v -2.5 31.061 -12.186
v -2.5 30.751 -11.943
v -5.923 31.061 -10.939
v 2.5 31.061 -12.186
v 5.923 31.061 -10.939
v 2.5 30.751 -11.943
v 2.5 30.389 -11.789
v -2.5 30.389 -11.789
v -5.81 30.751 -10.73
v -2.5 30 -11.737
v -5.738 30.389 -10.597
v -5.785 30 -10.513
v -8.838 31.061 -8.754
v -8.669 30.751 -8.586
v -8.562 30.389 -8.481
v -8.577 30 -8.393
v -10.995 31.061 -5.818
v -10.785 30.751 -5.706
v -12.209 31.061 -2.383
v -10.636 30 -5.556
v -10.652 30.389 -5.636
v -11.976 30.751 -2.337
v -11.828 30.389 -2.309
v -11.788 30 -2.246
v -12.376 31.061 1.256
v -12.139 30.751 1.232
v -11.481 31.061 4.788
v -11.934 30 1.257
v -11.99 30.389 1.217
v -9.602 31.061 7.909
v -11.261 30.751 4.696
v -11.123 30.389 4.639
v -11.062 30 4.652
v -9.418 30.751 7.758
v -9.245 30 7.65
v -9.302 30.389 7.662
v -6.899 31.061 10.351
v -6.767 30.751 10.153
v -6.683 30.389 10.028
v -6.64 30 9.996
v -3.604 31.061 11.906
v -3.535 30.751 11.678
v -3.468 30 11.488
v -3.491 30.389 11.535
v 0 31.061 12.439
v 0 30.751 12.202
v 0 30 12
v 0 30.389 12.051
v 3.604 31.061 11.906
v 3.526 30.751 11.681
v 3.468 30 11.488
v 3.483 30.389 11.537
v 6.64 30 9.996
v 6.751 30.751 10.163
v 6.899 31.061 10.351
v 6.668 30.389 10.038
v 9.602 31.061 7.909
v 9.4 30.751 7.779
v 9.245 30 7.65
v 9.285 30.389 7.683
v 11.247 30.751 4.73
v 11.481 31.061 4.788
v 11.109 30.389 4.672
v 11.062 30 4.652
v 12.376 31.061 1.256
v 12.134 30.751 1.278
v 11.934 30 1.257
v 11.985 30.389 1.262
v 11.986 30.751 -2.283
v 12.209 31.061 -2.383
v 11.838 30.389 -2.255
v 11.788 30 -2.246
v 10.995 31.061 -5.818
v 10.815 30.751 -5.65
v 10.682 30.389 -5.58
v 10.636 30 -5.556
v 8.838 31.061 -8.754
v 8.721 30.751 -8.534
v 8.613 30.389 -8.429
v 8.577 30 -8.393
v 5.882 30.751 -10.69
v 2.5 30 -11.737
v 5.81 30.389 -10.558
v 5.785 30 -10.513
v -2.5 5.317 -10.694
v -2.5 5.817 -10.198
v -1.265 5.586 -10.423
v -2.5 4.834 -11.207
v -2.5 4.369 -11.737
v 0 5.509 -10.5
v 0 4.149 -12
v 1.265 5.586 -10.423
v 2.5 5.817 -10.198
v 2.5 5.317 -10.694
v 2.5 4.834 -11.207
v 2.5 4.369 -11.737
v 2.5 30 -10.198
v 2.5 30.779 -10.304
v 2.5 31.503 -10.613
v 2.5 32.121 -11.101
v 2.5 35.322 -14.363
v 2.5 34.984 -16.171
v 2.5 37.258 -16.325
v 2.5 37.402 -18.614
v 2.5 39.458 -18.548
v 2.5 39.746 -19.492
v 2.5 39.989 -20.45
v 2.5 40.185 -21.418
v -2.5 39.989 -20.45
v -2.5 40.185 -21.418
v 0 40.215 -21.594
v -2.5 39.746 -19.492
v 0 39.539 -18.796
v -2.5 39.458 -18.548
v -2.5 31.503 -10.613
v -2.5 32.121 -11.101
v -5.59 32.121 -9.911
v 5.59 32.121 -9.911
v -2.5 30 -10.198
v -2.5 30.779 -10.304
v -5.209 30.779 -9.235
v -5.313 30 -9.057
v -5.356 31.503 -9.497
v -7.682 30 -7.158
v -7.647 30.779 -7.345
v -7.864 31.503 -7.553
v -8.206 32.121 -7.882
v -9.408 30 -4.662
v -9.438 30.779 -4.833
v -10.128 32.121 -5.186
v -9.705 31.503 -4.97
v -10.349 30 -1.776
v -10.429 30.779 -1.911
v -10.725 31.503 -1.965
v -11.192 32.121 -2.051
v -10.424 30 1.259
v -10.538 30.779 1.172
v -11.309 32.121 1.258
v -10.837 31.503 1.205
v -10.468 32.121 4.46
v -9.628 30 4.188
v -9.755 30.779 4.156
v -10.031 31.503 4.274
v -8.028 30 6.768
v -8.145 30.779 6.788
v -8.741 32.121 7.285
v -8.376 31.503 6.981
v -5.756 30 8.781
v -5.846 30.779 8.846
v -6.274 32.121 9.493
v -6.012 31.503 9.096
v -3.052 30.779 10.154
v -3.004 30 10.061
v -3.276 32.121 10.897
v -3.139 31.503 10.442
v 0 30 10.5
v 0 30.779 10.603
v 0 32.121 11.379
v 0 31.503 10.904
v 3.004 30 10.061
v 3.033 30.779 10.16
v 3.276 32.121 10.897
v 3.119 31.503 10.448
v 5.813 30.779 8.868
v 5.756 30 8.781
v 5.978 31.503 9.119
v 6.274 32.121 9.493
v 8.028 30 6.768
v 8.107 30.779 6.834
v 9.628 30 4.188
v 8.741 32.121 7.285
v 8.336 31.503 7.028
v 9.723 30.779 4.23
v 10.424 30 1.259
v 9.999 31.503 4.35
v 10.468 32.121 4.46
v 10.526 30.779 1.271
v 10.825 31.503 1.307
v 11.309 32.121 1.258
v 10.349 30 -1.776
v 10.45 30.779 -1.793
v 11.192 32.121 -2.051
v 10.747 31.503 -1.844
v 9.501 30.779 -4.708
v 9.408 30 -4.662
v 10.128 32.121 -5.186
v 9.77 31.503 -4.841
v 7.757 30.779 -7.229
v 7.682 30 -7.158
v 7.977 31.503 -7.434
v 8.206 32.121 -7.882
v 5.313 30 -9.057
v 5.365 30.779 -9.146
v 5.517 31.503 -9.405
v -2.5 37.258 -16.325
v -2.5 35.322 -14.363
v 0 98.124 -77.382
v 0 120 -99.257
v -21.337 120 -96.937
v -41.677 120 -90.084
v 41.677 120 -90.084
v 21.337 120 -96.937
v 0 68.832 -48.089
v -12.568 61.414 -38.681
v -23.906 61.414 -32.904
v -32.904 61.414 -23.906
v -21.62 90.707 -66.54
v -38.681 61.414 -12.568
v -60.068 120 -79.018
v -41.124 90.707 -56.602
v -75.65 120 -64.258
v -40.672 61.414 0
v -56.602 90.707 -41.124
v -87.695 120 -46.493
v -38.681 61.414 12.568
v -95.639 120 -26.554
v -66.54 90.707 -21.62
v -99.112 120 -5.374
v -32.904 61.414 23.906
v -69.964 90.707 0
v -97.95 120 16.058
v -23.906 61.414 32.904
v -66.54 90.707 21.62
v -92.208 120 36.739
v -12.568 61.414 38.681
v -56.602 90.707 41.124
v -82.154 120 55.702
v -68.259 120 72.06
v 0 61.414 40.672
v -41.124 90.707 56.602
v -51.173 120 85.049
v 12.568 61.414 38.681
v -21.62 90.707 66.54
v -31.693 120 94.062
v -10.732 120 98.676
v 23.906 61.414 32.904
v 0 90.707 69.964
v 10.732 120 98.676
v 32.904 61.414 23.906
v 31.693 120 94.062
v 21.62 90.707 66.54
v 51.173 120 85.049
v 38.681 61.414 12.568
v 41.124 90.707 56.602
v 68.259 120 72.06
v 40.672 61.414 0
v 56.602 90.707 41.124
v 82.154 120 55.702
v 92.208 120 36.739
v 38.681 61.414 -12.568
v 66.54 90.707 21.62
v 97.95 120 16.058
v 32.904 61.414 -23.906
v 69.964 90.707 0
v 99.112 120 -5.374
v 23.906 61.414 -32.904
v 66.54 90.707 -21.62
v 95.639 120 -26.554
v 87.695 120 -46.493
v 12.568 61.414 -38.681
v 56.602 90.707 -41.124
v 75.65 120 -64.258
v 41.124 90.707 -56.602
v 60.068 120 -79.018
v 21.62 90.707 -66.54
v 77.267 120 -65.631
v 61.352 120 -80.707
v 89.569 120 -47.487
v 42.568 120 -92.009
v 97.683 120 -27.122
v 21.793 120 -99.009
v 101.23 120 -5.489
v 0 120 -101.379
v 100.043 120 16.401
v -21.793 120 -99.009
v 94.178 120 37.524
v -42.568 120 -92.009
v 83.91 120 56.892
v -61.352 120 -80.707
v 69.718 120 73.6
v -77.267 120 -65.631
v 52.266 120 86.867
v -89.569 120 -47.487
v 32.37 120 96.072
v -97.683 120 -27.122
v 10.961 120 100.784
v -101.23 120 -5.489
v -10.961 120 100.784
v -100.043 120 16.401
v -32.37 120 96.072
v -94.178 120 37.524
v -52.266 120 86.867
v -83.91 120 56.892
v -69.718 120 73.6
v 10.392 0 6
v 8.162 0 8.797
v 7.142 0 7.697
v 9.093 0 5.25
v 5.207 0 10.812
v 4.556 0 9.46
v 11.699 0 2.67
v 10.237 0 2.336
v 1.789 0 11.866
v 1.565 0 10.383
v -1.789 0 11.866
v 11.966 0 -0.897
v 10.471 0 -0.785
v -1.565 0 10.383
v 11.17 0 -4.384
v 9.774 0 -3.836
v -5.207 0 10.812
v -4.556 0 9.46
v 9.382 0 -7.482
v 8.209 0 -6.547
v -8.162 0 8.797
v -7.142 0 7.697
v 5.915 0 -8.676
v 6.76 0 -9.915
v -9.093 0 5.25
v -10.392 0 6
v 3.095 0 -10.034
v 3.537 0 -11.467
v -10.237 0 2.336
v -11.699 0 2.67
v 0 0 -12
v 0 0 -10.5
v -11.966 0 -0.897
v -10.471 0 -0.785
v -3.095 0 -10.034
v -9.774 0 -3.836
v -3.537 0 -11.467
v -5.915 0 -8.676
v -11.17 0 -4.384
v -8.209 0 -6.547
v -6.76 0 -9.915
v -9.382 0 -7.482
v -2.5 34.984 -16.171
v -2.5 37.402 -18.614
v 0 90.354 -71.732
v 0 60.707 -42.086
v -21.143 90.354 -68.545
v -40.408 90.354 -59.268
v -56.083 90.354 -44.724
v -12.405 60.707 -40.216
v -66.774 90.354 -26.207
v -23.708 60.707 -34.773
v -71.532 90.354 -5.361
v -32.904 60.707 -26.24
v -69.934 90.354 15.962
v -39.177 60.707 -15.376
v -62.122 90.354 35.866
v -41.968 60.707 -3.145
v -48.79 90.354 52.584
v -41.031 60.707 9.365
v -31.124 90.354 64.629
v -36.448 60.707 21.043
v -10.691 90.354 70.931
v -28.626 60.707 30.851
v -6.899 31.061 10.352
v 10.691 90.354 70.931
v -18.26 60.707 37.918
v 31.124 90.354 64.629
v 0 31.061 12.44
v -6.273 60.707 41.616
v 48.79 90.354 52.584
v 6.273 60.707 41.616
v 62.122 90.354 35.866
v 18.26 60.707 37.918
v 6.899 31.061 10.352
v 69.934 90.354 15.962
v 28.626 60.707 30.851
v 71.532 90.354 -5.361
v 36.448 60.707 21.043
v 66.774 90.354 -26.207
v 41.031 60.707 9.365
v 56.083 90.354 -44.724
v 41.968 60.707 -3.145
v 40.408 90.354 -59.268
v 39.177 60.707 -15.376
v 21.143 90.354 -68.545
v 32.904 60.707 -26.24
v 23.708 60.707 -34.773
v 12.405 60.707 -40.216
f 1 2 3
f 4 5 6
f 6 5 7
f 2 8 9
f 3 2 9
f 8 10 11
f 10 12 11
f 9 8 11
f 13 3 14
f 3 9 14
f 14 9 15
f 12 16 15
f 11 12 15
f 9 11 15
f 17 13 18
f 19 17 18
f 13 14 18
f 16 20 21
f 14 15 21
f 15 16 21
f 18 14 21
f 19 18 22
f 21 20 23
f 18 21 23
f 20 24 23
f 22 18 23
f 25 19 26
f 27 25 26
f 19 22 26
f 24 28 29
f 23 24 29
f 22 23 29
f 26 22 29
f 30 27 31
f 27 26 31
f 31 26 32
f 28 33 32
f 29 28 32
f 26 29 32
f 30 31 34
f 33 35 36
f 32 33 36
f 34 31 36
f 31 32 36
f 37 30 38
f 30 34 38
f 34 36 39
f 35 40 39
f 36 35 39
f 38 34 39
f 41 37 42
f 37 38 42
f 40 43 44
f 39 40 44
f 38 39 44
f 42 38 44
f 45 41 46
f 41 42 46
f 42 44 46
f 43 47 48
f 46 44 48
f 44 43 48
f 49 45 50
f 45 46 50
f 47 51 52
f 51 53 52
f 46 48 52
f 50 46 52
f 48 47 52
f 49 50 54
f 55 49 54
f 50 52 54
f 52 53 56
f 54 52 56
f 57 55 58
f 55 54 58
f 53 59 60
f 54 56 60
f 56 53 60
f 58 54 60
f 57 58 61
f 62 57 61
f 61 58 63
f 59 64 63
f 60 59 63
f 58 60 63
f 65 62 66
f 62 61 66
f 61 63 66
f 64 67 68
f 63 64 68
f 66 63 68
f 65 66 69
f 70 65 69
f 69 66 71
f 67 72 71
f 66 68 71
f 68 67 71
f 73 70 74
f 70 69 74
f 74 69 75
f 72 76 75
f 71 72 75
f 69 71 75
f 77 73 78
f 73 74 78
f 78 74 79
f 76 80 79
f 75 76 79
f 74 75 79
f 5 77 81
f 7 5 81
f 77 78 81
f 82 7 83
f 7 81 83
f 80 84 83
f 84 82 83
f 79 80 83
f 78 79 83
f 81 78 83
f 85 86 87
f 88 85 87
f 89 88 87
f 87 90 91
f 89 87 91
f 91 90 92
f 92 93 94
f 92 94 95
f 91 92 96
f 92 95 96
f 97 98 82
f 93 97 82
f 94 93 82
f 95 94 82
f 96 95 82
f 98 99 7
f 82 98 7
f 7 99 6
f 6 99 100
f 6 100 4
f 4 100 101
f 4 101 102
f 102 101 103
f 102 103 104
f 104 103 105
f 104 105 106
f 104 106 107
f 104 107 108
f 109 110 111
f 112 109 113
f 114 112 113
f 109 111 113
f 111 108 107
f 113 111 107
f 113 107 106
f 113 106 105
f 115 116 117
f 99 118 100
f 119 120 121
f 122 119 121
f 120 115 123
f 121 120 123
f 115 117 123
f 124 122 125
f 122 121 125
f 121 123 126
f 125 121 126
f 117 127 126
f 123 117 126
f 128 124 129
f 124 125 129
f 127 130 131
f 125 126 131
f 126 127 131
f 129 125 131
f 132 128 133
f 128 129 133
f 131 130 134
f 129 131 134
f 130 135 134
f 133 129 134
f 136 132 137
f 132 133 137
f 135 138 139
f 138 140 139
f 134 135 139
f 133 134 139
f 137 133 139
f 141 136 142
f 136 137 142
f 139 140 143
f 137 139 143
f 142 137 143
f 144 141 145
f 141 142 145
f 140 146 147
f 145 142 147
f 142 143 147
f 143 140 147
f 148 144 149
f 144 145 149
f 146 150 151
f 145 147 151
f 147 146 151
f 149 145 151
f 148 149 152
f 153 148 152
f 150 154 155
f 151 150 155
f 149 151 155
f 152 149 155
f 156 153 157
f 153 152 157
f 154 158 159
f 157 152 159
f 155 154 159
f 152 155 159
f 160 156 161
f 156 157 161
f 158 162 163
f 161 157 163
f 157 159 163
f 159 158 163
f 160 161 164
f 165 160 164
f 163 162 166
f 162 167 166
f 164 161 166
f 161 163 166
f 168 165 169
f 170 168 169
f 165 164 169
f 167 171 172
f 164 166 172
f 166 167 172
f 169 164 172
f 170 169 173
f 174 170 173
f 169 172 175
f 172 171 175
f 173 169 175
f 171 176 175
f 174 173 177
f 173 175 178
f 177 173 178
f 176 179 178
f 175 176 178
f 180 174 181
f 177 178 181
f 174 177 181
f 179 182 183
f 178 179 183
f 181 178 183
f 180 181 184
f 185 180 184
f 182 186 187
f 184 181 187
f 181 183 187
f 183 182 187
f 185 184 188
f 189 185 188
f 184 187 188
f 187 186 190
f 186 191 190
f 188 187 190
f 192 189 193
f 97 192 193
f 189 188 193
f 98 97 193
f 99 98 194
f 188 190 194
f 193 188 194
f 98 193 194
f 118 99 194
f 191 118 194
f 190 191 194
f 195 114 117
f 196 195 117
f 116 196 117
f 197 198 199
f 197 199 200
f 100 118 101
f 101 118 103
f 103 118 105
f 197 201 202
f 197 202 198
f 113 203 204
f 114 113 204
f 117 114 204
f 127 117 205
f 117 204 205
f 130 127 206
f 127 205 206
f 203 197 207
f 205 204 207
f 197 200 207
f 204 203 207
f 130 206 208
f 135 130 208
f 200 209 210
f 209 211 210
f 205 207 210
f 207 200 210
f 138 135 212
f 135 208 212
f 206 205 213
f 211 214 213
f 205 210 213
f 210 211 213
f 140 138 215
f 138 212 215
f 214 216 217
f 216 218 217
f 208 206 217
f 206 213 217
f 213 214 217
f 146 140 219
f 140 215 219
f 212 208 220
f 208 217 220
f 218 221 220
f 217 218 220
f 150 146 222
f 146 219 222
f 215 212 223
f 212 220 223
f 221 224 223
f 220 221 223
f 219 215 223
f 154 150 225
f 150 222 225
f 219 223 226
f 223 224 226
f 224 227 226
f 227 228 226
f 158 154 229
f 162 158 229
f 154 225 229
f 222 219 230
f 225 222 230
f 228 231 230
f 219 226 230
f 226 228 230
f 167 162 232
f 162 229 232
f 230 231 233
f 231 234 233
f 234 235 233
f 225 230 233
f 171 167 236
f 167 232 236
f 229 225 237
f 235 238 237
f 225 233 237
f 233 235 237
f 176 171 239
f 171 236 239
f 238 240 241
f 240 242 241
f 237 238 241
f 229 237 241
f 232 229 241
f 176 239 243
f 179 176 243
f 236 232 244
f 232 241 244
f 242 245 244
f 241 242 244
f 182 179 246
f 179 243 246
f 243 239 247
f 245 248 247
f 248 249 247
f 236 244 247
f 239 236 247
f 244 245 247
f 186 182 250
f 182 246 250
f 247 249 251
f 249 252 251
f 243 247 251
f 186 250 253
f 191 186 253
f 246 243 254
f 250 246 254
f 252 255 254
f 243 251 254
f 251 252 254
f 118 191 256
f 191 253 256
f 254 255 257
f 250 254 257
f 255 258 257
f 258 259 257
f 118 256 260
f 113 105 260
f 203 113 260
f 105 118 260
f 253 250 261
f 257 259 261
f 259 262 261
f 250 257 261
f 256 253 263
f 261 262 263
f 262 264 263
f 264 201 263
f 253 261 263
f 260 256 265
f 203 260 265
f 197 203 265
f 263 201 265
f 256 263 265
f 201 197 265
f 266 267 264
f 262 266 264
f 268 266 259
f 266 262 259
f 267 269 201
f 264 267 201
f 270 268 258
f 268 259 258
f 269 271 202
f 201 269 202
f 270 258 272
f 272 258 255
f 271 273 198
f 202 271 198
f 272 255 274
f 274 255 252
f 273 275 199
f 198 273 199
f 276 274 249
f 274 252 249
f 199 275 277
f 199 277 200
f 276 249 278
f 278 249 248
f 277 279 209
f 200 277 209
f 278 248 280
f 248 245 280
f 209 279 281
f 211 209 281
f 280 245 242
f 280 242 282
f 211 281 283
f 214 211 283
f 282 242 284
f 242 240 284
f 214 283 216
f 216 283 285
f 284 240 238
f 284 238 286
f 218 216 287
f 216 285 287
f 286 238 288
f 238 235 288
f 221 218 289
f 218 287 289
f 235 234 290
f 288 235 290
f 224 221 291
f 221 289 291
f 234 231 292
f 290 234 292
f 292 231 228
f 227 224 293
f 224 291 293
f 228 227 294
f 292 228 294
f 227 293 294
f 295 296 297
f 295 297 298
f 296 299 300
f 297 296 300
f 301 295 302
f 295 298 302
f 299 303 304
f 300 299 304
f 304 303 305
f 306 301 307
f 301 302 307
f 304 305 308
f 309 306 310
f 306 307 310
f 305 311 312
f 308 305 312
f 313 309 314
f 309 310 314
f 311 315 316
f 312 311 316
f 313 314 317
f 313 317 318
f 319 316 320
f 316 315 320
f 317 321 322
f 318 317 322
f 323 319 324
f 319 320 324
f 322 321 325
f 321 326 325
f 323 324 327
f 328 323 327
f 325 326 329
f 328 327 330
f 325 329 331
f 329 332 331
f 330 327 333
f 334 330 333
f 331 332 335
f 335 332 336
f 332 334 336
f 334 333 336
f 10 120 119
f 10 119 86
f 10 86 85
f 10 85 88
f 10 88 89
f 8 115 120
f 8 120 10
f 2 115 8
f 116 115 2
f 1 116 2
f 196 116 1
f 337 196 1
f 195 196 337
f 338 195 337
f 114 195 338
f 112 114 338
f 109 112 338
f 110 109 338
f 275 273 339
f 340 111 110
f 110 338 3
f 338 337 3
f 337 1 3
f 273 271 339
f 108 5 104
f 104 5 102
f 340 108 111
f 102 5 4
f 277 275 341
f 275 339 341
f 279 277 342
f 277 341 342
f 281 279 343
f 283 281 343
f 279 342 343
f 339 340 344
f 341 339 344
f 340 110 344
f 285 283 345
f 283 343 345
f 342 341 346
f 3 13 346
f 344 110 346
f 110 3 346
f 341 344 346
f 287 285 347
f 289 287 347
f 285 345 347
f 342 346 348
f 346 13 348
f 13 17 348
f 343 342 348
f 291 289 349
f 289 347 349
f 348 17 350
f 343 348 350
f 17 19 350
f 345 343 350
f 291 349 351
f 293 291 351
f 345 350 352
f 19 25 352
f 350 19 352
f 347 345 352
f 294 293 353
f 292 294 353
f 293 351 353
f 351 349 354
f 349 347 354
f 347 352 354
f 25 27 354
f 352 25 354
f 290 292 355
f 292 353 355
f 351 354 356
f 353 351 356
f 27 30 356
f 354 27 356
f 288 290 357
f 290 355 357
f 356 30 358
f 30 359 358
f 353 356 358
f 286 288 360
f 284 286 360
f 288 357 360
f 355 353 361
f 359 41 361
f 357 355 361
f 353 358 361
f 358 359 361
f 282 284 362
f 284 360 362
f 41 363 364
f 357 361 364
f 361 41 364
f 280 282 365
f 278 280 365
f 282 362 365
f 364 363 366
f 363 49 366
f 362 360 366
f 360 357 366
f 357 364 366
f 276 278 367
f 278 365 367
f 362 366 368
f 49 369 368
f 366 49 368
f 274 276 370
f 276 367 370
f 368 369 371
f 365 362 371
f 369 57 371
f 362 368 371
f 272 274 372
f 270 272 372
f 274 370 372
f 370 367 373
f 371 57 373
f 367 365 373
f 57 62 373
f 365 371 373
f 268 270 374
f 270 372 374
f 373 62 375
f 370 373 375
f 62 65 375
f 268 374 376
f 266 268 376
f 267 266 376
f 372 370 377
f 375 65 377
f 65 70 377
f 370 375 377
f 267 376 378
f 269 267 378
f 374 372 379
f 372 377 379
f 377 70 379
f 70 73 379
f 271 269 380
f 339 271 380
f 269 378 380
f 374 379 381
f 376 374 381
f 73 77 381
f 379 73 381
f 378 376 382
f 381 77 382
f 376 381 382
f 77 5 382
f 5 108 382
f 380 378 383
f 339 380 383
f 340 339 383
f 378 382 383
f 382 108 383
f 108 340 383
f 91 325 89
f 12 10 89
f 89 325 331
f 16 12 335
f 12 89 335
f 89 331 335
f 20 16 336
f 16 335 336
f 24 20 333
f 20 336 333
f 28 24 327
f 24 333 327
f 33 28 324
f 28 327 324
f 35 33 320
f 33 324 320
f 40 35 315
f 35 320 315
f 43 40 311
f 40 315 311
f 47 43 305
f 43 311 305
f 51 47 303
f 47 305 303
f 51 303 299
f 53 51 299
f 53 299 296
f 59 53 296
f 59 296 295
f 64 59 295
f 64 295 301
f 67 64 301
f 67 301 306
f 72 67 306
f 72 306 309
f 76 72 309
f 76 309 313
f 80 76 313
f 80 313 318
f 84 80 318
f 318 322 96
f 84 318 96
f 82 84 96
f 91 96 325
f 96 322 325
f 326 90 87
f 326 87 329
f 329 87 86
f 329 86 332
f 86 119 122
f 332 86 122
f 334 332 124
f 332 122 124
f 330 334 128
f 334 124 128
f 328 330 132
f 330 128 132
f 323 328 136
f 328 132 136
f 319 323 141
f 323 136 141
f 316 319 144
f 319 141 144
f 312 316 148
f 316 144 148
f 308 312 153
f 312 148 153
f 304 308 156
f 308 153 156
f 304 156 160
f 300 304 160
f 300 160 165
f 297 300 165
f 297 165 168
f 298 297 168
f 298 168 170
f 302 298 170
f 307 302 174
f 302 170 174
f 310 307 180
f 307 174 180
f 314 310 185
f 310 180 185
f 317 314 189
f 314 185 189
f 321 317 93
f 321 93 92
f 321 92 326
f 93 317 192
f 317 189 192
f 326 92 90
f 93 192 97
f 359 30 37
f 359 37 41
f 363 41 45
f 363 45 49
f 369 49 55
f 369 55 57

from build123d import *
from build123d.topology import SkipClean

# Parameters (mm, degrees)
SKETCH3_R          = 20.5
CUT_EXTRUDE1_DEPTH = 2.5


with BuildPart() as part:
    # Sketch2 → Revolve1 (revolve)
    with BuildSketch(Plane.XY, mode=Mode.PRIVATE) as revolve1_sk:
        with BuildLine():
            Line((-12, 0), (-10.5, 0))
            Line((-10.5, 0), (-10.5, 30))
            ThreePointArc((-10.5, 30), (-10.728361402, 31.148050297), (-11.378679656, 32.121320344))
            Line((-11.378679656, 32.121320344), (-99.257359313, 120))
            Line((-99.257359313, 120), (-101.378679656, 120))
            Line((-101.378679656, 120), (-12.43972081, 31.061041153))
            Line((-12.43972081, 31.061041153), (-12.439339828, 31.060660172))
            ThreePointArc((-12.439339828, 31.060660172), (-12.114180701, 30.574025149), (-12, 30))
            Line((-12, 30), (-12, 0))
        make_face()
    revolve(revolve1_sk.sketch.rotate(Axis((0, 0, 0), (0, 1, 0)), 270), axis=Axis((0, 0, 0), (0, 1, 0)))

    # Sketch3 → Cut-Extrude1 (cut, symmetric)
    with SkipClean():  # the faces are left unmerged after this step: merging them gives an invalid solid
        with BuildSketch(Plane(origin=(0, 0, 0), x_dir=(0, 0, -1), z_dir=(1, 0, 0))):
            with Locations((25, 20)):
                Circle(SKETCH3_R)
        extrude(amount=CUT_EXTRUDE1_DEPTH, both=True, mode=Mode.SUBTRACT)


solid = part.part
